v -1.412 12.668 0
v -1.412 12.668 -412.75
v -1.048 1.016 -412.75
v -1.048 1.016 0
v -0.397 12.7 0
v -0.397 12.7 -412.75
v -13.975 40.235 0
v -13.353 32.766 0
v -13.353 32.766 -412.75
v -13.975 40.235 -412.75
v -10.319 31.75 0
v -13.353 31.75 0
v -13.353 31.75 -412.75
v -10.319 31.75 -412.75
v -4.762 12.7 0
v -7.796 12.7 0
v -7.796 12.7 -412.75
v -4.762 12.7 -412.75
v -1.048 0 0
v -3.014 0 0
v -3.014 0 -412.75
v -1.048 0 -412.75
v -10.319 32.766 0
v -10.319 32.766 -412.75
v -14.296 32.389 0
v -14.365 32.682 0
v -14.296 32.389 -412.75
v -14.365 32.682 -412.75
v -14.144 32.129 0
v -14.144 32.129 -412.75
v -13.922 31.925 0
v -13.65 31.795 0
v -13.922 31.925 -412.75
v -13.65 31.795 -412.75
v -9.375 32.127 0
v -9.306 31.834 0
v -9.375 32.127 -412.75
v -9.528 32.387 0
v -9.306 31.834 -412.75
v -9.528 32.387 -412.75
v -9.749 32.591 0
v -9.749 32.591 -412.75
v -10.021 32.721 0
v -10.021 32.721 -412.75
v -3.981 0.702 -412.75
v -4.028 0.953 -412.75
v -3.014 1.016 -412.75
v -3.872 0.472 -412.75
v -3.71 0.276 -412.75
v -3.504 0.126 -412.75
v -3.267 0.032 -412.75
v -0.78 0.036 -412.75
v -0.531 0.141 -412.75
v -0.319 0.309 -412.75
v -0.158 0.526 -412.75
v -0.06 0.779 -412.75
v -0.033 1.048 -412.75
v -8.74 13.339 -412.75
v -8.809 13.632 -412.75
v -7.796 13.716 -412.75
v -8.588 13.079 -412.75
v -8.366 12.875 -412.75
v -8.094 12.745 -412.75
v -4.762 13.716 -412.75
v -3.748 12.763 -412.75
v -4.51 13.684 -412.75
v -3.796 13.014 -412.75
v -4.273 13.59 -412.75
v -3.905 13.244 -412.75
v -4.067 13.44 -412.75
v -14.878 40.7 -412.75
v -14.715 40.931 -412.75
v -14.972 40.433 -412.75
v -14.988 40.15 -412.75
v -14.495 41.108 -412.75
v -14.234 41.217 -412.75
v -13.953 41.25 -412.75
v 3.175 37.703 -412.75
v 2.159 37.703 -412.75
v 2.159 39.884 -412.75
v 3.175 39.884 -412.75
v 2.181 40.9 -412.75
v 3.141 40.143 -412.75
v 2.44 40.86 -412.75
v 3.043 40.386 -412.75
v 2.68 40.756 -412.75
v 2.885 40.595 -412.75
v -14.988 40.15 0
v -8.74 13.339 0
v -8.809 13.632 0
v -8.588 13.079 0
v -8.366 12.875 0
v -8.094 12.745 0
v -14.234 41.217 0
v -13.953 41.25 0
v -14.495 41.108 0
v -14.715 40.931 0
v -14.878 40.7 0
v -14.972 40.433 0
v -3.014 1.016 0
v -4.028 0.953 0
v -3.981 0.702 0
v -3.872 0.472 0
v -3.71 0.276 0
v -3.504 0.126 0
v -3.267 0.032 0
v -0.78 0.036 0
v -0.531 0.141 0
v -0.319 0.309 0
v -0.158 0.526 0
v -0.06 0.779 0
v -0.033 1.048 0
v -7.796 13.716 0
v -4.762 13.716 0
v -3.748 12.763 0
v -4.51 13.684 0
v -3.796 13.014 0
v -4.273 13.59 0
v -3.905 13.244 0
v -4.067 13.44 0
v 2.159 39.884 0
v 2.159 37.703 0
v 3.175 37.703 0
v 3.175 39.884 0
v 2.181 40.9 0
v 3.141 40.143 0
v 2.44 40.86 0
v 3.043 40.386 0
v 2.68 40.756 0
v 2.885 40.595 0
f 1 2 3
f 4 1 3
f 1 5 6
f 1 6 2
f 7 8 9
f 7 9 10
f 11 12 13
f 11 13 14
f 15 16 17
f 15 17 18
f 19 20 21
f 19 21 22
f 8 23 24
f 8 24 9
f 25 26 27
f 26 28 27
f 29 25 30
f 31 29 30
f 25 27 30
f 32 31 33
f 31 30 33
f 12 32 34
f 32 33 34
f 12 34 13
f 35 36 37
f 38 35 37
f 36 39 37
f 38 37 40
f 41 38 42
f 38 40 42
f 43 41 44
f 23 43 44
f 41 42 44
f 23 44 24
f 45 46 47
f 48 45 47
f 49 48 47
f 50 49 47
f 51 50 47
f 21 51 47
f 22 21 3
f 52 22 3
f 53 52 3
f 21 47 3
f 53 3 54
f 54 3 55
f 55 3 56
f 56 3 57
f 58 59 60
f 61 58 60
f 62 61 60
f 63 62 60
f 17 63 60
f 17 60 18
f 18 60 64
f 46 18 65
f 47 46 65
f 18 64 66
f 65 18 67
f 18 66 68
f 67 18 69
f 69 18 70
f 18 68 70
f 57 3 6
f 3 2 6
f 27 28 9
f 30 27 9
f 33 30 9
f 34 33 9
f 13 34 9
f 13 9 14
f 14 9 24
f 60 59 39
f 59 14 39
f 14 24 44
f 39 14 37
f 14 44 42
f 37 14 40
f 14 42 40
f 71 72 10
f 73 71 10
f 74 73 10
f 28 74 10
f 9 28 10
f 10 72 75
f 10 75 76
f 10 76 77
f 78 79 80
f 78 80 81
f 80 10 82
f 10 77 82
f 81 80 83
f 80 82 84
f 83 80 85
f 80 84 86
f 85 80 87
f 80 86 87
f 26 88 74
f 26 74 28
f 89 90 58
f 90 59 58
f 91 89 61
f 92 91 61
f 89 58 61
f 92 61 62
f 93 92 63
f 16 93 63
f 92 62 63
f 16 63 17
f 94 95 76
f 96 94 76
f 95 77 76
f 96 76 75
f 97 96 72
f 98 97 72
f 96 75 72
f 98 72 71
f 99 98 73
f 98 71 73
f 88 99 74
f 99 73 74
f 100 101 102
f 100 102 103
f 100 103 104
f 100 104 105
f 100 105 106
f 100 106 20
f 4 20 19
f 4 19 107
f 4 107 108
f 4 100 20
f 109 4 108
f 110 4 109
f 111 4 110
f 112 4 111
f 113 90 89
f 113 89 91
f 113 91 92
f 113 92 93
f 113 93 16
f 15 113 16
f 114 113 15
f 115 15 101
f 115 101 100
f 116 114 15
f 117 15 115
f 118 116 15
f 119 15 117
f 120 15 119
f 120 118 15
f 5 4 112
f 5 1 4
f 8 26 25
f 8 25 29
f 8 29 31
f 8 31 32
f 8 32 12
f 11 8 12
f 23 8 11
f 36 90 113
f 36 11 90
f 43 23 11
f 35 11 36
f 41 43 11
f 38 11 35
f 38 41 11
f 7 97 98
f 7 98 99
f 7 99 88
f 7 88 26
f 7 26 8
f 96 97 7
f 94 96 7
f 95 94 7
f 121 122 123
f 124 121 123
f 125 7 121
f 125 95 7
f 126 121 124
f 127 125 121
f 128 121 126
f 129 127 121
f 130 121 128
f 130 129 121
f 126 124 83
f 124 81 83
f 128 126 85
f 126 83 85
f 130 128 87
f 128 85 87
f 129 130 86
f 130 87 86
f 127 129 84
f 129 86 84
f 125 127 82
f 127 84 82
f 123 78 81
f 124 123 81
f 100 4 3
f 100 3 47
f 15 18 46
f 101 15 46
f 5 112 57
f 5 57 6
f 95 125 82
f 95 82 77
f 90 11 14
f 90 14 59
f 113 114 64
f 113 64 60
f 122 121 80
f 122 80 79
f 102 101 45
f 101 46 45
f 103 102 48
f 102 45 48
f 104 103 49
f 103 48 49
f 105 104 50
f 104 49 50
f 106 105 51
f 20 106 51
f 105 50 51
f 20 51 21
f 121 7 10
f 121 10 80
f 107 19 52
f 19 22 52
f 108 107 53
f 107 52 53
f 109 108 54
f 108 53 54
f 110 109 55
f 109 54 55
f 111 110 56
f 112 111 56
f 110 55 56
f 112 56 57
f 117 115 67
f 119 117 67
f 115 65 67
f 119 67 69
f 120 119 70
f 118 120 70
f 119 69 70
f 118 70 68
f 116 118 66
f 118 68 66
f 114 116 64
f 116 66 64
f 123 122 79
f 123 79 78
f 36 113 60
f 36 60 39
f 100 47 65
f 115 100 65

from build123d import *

# Parameters (mm, degrees)
EXTRUDE_THIN1_DEPTH = 412.75
FILLET1_R           = 1.016


with BuildPart() as part:
    # Sketch1 → Extrude-Thin1 (new body)
    with BuildSketch(Plane.XY):
        Polygon((3.175, 37.703125), (3.175, 40.878125), (-15.08125, 41.275), (-14.2875, 31.75), (-10.31875, 31.75), (-8.73125, 12.7), (-4.7625, 12.7), (-3.96875, 0), (0, 0), (-0.396875, 12.7), (-1.412379269, 12.668265492), (-1.048245973, 1.016), (-3.014267559, 1.016), (-3.808017559, 13.716), (-7.796394992, 13.716), (-9.383894992, 32.766), (-13.352644992, 32.766), (-13.975037647, 40.234711858), (2.159, 39.883971909), (2.159, 37.703125), align=None)
    extrude(amount=-EXTRUDE_THIN1_DEPTH)

    # Fillet1
    fillet1_edges = [part.edges().sort_by_distance(p)[0] for p in [
        (-9.383894992, 32.766, -206.375),
        (-3.808017559, 13.716, -206.375),
        (0, 0, -206.375),
        (-3.96875, 0, -206.375),
        (-8.73125, 12.7, -206.375),
        (-14.2875, 31.75, -206.375),
        (-15.08125, 41.275, -206.375),
        (3.175, 40.878125, -206.375),
    ]]
    fillet(fillet1_edges, radius=FILLET1_R)


solid = part.part
